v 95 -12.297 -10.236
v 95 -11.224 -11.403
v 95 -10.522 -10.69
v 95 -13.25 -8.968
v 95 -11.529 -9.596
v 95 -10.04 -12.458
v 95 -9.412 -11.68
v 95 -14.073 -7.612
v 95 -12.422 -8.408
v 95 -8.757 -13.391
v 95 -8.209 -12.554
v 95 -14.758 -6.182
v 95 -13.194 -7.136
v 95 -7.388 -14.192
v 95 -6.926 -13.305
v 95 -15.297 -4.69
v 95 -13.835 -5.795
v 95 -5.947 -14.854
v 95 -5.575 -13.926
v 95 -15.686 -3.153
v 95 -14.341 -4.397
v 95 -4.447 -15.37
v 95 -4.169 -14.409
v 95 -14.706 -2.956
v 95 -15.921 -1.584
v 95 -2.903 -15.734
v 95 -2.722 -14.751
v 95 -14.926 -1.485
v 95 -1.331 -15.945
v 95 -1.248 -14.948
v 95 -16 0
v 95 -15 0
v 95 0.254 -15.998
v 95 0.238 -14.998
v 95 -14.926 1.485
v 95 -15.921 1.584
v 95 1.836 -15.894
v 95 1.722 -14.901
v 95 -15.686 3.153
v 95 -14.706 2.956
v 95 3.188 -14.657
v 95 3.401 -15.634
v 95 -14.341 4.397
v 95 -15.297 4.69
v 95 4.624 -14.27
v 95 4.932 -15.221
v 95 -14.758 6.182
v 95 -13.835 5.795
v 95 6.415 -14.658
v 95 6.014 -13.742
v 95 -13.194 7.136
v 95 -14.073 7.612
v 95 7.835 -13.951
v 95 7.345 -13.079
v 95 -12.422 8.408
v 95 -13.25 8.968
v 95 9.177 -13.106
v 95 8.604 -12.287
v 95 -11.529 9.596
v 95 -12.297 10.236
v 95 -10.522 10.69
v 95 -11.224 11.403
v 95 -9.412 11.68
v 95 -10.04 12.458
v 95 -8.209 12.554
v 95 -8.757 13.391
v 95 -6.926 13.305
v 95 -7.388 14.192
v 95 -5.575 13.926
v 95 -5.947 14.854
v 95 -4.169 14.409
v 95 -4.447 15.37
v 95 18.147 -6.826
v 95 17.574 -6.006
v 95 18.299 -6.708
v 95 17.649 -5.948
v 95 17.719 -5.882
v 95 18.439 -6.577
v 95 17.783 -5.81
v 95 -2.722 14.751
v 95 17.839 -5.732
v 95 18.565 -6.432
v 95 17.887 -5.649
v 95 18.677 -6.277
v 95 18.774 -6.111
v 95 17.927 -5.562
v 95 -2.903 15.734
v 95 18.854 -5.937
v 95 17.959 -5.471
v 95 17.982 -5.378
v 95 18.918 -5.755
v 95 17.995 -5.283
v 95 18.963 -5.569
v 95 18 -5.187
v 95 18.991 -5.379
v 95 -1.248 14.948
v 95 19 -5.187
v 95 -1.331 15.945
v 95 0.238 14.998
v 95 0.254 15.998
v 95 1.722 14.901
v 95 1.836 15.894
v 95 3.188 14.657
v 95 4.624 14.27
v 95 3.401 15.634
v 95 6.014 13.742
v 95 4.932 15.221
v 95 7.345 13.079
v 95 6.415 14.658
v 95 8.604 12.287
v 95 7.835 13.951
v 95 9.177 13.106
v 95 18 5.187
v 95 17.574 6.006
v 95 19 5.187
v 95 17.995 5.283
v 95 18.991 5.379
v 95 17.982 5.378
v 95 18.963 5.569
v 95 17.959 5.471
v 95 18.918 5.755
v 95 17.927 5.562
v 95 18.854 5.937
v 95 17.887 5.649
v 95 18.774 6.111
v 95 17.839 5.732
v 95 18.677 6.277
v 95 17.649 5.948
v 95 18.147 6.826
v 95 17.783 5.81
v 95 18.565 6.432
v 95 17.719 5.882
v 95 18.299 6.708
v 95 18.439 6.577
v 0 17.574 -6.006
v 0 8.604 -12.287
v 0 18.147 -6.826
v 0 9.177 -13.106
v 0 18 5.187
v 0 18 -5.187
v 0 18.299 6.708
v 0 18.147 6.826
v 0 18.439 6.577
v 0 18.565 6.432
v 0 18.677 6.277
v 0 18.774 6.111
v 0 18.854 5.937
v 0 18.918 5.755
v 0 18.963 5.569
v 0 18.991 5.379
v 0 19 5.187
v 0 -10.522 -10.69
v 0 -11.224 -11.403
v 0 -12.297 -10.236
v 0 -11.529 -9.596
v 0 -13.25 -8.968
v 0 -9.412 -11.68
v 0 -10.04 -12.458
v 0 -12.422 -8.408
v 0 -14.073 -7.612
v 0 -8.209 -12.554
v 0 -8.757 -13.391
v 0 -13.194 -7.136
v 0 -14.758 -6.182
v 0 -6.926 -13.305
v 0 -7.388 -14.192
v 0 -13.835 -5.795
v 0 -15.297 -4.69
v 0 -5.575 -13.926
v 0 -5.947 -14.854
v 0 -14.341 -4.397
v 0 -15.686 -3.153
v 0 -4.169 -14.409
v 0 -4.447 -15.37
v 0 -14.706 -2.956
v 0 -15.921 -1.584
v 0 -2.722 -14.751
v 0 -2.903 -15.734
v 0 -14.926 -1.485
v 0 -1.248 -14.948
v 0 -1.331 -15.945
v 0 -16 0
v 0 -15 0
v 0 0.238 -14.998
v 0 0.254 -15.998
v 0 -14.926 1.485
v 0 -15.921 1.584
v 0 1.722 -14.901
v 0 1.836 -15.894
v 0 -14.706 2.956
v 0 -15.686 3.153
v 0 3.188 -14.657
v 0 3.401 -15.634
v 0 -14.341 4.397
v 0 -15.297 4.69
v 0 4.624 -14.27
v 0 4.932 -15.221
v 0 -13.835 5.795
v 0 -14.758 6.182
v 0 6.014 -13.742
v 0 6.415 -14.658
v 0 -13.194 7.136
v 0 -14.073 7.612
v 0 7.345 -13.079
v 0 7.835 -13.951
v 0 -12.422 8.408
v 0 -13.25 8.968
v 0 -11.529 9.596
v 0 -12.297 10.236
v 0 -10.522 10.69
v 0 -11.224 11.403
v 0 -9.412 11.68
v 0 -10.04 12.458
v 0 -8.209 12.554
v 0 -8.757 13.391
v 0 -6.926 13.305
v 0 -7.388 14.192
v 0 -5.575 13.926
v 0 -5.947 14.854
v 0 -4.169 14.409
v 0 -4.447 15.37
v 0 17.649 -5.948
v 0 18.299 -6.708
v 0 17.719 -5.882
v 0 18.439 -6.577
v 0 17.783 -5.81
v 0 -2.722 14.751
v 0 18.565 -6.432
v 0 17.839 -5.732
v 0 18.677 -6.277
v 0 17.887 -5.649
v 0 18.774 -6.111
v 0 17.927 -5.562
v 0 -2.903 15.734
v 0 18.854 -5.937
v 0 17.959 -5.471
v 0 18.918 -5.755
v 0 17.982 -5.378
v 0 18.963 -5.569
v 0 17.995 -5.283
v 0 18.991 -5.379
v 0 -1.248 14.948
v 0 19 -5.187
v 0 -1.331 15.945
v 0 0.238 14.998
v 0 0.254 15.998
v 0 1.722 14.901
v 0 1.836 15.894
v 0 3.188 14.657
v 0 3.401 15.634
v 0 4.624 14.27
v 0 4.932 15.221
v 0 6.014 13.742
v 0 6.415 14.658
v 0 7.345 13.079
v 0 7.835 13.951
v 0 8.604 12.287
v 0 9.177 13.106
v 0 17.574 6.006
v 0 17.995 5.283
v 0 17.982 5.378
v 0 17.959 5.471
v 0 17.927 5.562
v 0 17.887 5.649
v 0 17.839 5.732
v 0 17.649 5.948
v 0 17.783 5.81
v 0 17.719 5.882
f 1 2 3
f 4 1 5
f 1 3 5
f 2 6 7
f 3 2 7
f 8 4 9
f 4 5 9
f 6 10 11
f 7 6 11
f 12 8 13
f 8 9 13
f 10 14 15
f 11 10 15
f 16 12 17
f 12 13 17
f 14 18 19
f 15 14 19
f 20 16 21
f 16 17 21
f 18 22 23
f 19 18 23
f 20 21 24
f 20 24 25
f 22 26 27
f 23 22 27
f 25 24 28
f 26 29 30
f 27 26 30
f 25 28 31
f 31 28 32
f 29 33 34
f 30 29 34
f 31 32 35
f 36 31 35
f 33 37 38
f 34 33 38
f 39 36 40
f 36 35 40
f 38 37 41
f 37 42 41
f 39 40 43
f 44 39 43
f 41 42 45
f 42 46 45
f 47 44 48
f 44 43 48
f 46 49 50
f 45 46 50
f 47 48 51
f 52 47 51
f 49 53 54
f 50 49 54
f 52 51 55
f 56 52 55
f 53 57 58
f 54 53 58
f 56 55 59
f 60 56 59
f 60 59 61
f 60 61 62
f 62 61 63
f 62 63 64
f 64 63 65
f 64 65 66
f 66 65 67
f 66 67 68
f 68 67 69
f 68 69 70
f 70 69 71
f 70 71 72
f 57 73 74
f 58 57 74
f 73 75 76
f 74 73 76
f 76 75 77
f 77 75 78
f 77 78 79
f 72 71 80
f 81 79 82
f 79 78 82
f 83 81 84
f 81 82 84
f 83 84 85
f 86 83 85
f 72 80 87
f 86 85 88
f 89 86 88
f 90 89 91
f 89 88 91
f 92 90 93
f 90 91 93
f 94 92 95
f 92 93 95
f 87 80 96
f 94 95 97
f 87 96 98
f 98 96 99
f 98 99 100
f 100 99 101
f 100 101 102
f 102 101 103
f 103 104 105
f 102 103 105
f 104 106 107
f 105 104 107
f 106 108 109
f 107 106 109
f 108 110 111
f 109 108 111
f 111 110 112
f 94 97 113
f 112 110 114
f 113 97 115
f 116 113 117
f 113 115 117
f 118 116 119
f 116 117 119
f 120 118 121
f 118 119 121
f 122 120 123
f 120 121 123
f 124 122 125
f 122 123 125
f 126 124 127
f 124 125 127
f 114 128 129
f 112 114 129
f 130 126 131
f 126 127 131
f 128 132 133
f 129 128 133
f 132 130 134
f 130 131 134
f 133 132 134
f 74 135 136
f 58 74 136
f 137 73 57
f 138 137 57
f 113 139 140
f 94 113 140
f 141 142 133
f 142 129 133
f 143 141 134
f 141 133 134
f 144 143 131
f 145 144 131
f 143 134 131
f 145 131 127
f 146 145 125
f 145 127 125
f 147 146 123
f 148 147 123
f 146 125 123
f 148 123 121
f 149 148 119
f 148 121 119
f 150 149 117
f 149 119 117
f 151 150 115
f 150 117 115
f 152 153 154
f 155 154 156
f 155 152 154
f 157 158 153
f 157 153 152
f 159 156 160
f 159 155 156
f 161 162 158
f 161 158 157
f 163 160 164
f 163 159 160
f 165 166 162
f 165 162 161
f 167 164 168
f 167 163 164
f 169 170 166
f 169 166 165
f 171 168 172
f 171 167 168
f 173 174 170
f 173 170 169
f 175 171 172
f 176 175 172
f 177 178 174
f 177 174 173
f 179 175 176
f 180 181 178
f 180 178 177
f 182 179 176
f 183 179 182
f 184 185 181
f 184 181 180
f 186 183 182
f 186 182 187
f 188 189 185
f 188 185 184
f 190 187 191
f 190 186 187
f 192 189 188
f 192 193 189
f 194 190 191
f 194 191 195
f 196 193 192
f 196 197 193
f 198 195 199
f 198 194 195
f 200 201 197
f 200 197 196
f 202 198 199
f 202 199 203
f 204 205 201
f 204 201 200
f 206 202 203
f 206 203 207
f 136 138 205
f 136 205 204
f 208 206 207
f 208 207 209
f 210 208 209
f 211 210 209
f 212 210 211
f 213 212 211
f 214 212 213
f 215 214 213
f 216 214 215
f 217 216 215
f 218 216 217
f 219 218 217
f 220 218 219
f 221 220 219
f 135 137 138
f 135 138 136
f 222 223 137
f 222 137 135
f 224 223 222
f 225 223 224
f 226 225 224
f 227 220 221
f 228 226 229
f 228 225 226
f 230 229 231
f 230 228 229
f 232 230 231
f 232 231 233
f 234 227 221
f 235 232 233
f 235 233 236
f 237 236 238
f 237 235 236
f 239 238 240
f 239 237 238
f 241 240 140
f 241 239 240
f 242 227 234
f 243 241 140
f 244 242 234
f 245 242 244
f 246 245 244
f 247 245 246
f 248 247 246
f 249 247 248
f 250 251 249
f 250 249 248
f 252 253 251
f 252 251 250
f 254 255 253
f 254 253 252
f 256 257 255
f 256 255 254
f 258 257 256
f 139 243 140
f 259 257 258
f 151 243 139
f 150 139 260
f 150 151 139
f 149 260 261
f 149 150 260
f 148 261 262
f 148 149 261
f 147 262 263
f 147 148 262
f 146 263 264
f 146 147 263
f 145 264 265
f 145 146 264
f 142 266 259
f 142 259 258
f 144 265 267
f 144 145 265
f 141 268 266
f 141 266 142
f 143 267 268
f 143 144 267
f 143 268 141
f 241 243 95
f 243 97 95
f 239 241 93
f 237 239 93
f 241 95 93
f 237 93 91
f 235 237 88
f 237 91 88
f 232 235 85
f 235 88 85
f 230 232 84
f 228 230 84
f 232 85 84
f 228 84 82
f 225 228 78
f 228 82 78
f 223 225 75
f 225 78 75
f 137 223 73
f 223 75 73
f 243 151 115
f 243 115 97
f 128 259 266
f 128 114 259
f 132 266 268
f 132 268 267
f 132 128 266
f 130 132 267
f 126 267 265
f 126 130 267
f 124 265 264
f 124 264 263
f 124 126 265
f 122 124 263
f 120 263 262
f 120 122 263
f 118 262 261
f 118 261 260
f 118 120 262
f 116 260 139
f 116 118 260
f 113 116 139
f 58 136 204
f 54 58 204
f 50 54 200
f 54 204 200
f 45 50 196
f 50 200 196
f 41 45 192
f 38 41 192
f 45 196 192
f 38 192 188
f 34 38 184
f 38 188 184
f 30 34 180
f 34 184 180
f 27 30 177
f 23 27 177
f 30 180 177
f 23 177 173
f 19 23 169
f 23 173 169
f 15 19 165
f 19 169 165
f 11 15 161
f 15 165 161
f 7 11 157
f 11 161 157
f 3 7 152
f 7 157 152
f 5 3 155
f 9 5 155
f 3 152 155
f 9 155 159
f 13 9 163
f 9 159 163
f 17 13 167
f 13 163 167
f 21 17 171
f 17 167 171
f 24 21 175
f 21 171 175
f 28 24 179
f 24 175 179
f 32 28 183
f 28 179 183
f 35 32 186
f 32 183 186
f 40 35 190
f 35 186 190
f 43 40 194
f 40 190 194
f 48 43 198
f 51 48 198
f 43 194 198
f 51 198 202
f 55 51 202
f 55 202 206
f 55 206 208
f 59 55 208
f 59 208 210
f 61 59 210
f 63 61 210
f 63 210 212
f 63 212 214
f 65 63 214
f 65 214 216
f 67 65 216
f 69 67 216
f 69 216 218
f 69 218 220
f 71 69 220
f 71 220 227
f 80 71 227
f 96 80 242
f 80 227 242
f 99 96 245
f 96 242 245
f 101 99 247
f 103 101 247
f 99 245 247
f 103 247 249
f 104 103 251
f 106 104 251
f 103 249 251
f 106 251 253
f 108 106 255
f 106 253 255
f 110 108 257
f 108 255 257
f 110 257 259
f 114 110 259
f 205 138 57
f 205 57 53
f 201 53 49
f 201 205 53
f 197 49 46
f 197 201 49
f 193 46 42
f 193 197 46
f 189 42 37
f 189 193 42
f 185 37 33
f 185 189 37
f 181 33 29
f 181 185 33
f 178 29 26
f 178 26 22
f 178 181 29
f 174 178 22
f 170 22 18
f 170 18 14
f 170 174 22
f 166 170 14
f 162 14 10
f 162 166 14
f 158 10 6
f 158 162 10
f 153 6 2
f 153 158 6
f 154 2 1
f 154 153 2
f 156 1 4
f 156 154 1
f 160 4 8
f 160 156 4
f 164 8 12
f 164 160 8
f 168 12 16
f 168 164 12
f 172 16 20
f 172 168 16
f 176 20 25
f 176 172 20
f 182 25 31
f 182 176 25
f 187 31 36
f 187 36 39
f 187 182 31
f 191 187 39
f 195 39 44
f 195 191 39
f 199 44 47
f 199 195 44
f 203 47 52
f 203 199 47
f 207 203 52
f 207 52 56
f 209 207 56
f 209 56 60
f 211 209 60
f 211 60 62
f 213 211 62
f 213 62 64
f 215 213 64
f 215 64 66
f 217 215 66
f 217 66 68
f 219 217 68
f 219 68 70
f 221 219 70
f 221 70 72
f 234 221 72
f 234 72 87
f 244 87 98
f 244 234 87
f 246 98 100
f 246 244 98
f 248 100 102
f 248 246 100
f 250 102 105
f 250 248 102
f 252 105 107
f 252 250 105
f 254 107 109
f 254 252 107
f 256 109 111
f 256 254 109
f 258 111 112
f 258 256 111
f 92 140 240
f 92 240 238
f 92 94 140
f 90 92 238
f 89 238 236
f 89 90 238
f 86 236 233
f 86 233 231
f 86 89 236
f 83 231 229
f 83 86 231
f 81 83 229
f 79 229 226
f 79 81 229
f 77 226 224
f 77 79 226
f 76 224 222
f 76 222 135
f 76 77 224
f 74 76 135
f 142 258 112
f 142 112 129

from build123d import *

# Parameters (mm, degrees)
LINEAR_AUSTRAGEN_D_NN1_DEPTH = 95
VERRUNDUNG1_R                = 2
VERRUNDUNG2_R                = 1


with BuildPart() as part:
    # Skizze1 → Linear-Austragen-Dünn1 (new body)
    with BuildSketch(Plane(origin=(0, 0, 0), x_dir=(0, 0, -1), z_dir=(1, 0, 0))):
        with BuildLine():
            Line((-13.106432709, 9.177222982), (-6.228450194, 19))
            Line((-6.228450194, 19), (6.228450194, 19))
            Line((6.228450194, 19), (13.106432709, 9.177222982))
            ThreePointArc((13.106432709, 9.177222982), (0, -16), (-13.106432709, 9.177222982))
        make_face()
        with BuildLine():
            Line((-12.287280664, 8.603646545), (-5.707883144, 18))
            Line((-5.707883144, 18), (5.707883144, 18))
            Line((5.707883144, 18), (12.287280664, 8.603646545))
            ThreePointArc((12.287280664, 8.603646545), (0, -15), (-12.287280664, 8.603646545))
        make_face(mode=Mode.SUBTRACT)
    extrude(amount=LINEAR_AUSTRAGEN_D_NN1_DEPTH)

    # Verrundung1
    verrundung1_edges = [part.edges().sort_by_distance(p)[0] for p in [
        (47.5, 19, 6.228450194),
        (47.5, 19, -6.228450194),
    ]]
    fillet(verrundung1_edges, radius=VERRUNDUNG1_R)

    # Verrundung2
    verrundung2_edges = [part.edges().sort_by_distance(p)[0] for p in [
        (47.5, 18, -5.707883144),
        (47.5, 18, 5.707883144),
    ]]
    fillet(verrundung2_edges, radius=VERRUNDUNG2_R)


solid = part.part
